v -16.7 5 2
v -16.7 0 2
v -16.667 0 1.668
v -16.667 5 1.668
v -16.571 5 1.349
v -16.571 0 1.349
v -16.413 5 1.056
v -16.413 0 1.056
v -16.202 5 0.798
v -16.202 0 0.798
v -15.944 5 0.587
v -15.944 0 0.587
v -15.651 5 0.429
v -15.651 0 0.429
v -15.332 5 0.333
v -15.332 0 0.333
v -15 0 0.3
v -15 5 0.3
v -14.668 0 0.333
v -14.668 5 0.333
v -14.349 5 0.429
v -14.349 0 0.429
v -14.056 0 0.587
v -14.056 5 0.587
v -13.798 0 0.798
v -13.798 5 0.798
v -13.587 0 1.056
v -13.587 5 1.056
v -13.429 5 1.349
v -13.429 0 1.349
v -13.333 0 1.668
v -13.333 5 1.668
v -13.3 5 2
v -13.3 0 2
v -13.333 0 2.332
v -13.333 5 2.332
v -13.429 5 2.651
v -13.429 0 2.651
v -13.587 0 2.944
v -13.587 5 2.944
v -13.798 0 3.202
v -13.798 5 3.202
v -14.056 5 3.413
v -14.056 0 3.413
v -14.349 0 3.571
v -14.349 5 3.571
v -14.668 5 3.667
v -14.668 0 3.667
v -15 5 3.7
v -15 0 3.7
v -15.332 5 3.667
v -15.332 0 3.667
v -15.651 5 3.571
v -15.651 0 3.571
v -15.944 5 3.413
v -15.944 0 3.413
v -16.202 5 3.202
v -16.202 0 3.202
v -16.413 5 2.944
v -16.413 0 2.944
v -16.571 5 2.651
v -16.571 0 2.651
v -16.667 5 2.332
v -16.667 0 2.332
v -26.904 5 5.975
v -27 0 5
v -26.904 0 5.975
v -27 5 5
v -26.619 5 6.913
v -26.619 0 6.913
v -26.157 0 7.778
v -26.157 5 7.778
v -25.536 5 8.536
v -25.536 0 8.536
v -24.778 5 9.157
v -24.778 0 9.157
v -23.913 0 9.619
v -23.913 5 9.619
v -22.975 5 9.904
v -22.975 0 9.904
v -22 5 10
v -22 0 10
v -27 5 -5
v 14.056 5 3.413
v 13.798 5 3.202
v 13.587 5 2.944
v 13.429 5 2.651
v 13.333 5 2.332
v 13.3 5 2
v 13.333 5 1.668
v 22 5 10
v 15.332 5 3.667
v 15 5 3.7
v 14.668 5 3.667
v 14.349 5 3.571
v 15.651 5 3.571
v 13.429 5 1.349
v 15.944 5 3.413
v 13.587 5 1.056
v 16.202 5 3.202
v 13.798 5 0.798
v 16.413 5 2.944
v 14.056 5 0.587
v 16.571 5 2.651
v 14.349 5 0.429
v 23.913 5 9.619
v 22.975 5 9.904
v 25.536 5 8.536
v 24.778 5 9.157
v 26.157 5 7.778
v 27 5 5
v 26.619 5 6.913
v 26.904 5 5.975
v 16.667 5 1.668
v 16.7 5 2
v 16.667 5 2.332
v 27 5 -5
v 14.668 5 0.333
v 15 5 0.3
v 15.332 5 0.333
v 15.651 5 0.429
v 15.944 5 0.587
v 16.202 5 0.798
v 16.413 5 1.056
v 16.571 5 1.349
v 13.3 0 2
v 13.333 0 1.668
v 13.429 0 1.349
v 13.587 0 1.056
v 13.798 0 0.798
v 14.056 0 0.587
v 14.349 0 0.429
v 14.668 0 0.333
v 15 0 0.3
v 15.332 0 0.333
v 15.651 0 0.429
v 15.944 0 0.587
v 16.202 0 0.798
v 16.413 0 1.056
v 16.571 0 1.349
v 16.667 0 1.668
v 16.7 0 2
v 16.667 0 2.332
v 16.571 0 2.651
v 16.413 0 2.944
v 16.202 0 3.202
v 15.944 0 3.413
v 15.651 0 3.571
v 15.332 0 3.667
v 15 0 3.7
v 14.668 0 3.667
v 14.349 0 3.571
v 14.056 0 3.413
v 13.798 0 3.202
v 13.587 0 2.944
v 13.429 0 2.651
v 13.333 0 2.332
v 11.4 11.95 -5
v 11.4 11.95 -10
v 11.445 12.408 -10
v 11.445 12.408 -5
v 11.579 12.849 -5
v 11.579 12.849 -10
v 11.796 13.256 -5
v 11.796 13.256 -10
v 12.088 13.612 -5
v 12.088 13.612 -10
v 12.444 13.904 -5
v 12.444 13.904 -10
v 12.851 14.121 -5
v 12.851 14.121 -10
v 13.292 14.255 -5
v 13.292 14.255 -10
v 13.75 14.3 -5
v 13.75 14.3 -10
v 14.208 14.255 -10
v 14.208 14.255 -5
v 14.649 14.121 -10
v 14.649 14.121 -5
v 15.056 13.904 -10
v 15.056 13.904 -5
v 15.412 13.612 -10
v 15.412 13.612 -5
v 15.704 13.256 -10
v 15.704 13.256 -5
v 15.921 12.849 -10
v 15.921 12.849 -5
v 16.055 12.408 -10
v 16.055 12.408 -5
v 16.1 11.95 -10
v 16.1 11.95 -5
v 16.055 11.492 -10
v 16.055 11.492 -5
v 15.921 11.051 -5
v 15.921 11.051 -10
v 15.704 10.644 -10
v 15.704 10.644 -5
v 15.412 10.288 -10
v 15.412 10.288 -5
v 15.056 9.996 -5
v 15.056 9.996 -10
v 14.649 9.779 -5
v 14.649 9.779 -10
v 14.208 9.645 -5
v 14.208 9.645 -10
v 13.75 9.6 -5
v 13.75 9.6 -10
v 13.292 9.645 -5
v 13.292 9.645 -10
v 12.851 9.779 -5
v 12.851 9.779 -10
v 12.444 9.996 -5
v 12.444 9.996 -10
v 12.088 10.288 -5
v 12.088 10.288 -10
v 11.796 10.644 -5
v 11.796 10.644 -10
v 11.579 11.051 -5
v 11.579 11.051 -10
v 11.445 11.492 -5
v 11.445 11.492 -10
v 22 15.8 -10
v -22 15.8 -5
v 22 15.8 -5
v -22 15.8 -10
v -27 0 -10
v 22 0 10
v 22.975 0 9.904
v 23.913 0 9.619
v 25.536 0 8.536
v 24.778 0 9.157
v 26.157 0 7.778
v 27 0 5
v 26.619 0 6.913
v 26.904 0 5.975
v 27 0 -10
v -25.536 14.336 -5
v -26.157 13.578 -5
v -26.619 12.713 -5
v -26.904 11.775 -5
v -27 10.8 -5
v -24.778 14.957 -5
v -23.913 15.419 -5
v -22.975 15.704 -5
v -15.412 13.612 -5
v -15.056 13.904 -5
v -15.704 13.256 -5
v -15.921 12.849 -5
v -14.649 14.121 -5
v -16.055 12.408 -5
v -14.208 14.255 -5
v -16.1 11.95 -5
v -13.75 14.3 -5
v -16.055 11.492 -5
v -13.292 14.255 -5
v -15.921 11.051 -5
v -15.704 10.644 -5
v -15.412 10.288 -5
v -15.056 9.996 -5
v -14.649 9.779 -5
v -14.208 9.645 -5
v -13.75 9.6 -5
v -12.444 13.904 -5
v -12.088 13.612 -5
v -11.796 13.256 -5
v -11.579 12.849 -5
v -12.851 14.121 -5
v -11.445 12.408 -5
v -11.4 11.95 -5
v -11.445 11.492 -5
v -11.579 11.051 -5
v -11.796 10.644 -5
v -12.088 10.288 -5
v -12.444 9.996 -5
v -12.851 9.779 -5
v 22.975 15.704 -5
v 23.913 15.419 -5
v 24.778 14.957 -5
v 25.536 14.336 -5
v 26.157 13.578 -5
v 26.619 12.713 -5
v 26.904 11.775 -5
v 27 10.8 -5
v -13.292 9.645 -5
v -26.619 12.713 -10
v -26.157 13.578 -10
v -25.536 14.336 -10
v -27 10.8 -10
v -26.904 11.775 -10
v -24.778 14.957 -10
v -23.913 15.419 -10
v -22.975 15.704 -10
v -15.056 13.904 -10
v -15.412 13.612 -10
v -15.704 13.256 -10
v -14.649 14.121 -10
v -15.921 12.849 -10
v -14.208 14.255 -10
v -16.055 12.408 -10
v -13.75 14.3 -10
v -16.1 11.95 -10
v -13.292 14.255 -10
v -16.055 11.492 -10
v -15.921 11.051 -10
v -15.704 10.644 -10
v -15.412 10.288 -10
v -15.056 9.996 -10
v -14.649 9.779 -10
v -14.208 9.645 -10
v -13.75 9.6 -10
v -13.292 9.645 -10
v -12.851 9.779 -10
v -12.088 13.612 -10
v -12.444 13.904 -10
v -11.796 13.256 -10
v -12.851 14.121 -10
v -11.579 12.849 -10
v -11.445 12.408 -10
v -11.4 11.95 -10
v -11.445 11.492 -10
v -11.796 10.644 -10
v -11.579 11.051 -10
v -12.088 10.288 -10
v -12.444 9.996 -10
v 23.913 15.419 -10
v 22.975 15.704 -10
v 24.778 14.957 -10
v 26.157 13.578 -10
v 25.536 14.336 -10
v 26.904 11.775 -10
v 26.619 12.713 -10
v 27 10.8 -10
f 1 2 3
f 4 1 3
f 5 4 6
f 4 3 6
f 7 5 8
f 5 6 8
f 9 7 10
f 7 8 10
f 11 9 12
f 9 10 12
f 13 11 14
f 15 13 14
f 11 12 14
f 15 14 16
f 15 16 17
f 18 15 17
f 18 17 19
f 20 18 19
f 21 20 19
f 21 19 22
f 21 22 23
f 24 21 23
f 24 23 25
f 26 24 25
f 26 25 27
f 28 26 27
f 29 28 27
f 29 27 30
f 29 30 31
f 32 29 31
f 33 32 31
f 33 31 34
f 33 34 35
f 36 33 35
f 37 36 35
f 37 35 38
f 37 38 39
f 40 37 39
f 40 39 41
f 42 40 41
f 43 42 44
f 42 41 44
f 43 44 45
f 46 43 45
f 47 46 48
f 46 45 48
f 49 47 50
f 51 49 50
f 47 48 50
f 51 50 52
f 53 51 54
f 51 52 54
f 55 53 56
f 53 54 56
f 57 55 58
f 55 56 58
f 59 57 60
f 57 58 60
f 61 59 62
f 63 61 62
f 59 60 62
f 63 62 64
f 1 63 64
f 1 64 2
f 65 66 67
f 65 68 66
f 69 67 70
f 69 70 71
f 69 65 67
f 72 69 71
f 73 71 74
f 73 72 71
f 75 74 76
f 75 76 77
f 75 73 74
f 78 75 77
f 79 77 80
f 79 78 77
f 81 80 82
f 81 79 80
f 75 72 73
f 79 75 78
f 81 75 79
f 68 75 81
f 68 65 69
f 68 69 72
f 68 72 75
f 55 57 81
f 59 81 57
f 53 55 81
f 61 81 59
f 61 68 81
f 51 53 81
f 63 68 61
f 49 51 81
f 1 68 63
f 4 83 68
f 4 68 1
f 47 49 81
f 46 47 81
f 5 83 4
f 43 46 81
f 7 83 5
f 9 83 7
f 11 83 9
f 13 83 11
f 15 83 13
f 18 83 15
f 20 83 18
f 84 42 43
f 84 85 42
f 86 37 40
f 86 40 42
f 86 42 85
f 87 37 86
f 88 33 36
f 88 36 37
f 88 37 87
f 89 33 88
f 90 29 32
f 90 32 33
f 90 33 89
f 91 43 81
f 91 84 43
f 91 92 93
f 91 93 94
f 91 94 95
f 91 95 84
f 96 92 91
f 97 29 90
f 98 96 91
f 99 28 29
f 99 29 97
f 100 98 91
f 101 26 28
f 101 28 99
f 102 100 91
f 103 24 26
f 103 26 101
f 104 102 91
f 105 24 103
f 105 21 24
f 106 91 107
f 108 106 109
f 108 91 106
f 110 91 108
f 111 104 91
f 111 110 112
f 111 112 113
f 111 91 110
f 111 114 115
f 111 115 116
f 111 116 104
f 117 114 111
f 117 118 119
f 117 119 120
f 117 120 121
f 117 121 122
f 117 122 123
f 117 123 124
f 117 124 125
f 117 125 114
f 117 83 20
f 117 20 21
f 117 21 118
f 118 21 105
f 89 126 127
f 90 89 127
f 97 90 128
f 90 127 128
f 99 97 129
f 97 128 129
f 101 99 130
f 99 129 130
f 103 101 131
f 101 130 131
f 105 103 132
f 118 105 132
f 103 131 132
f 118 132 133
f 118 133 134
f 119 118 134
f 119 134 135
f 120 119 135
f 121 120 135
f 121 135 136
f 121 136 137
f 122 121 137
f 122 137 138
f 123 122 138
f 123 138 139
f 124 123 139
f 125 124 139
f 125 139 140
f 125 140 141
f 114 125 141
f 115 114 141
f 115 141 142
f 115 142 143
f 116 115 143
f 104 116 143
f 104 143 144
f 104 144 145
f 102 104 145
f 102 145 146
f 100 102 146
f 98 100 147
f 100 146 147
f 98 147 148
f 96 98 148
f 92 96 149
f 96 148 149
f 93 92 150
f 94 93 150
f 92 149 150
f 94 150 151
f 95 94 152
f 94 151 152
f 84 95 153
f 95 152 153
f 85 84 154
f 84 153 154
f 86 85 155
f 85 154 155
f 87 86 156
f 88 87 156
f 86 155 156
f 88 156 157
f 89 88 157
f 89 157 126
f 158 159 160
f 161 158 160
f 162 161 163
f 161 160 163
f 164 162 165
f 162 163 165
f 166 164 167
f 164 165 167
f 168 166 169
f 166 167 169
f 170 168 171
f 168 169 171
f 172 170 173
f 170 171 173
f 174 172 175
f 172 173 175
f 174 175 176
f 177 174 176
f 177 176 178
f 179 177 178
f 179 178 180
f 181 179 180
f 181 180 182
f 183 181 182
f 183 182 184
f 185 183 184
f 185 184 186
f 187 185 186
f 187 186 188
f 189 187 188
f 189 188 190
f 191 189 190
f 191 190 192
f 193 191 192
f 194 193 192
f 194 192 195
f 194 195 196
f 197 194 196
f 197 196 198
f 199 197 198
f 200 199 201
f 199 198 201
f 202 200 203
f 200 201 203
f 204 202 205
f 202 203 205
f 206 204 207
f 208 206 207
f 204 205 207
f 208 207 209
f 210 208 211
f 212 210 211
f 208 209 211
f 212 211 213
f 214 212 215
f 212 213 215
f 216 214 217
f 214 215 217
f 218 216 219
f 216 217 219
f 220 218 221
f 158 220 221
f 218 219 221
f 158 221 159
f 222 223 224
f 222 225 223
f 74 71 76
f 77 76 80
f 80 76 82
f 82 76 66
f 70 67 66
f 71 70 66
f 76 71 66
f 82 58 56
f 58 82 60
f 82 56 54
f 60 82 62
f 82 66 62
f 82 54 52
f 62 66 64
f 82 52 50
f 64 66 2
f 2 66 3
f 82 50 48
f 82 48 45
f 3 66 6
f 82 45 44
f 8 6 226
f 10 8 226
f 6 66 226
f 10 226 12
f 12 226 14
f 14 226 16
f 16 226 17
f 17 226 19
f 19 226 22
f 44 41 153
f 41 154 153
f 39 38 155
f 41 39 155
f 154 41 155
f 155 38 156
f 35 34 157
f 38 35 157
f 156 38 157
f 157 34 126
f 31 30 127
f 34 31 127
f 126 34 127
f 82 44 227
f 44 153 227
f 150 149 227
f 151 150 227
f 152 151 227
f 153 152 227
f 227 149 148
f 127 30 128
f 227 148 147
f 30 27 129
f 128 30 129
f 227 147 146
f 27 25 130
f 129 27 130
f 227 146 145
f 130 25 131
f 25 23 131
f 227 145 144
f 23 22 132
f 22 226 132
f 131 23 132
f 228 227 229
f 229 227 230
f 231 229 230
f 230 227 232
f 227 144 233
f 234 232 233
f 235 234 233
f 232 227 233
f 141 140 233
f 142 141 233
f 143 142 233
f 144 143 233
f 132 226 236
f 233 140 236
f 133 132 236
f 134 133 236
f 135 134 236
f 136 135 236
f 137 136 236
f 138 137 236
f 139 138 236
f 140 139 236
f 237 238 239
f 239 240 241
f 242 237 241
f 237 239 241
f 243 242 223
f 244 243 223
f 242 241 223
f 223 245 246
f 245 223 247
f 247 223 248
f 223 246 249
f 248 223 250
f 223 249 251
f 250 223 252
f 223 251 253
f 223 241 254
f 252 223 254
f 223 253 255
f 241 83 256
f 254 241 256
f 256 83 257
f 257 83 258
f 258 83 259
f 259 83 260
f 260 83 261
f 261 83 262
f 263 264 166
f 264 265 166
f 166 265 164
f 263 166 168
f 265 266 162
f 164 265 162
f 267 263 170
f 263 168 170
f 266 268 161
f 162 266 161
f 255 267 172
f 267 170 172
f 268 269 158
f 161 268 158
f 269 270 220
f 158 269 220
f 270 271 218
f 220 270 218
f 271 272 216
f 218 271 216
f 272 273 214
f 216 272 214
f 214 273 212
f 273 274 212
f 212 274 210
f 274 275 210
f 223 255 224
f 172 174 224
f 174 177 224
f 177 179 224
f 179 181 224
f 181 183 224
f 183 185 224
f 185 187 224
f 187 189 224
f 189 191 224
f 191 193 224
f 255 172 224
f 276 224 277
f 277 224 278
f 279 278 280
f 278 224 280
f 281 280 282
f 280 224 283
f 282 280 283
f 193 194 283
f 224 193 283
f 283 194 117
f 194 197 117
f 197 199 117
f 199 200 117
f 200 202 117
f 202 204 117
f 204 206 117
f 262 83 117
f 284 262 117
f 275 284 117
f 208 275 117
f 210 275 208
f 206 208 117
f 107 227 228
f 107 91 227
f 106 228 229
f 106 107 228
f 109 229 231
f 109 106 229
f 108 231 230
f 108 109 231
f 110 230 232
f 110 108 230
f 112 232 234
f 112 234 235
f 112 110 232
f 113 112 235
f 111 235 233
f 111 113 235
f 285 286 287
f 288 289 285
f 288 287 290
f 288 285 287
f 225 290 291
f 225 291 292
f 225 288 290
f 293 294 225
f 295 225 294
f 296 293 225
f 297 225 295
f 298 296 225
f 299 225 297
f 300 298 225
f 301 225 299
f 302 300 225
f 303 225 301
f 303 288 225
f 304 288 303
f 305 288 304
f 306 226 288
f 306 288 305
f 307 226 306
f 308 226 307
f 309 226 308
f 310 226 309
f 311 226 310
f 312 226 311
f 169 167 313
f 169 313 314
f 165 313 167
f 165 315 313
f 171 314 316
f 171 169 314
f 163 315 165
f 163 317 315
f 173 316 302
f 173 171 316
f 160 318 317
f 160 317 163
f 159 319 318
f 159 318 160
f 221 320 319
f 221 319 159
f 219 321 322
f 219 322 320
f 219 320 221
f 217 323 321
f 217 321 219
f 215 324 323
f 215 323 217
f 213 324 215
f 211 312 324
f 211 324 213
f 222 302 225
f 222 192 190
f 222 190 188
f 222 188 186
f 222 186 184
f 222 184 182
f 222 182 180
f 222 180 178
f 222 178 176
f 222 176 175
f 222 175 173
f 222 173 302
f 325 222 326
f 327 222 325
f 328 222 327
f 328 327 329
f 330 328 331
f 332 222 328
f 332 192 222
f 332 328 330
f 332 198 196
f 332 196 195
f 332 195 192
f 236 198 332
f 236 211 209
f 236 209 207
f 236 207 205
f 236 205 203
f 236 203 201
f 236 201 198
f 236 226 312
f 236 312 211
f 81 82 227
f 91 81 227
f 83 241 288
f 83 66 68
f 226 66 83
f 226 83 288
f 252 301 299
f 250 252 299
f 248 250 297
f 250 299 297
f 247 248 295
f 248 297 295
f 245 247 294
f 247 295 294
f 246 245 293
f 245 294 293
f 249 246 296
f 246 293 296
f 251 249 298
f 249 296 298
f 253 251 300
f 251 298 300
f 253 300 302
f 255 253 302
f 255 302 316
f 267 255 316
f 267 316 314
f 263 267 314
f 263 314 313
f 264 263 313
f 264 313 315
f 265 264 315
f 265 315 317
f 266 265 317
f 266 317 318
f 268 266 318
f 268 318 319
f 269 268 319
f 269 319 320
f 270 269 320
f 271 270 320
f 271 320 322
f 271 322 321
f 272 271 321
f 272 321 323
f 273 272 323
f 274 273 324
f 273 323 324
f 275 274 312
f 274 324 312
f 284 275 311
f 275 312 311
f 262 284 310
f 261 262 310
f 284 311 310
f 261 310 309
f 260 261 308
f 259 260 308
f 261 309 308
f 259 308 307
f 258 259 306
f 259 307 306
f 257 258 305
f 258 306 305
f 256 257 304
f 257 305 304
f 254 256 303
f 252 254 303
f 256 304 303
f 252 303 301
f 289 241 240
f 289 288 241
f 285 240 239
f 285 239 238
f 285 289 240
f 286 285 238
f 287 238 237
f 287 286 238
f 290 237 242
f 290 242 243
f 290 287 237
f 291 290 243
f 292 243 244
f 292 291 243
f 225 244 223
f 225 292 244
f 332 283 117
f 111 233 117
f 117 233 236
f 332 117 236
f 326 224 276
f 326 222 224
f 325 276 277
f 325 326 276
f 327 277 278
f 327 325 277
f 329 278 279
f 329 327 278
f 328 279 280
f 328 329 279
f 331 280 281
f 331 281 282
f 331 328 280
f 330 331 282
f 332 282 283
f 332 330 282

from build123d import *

# Parameters (mm, degrees)
SKETCH1_W                = 54
SKETCH1_H                = 20
BOSS_EXTRUDE1_DEPTH      = 5
SKETCH2_W                = 54
SKETCH2_H                = 5
BOSS_EXTRUDE2_DEPTH      = 10.8
M3_CLEARANCE_HOLE1_D     = 3.4
M3_CLEARANCE_HOLE1_DEPTH = 28.71
M3_CLEARANCE_HOLE1_TIP   = 1.021463052
M3_CLEARANCE_HOLE2_D     = 3.4
FILLET1_R                = 5
SKETCH11_R               = 2.35
CUT_EXTRUDE4_DEPTH       = 7.8
SKETCH9_R                = 2.35
CUT_EXTRUDE5_DEPTH       = 7.8


with BuildPart() as part:
    # Sketch1 → Boss-Extrude1 (new body)
    with BuildSketch(Plane(origin=(0, 0, 0), x_dir=(1, 0, 0), z_dir=(0, 1, 0))):
        Rectangle(SKETCH1_W, SKETCH1_H)
    extrude(amount=BOSS_EXTRUDE1_DEPTH)

    # Sketch2 → Boss-Extrude2 (add)
    with BuildSketch(Plane(origin=(0, 5, 0), x_dir=(1, 0, 0), z_dir=(0, 1, 0))):
        with Locations((0, 7.5)):
            Rectangle(SKETCH2_W, SKETCH2_H)
    extrude(amount=BOSS_EXTRUDE2_DEPTH)

    # M3 Clearance Hole1
    with Locations(Plane.XY.offset(-5)):
        with Locations((-13.75, 12.6), (13.75, 12.6)):
            Hole(M3_CLEARANCE_HOLE1_D / 2, depth=M3_CLEARANCE_HOLE1_DEPTH)
            with Locations((0, 0, -(M3_CLEARANCE_HOLE1_DEPTH + M3_CLEARANCE_HOLE1_TIP / 2))):  # 118° drill point
                Cone(0, M3_CLEARANCE_HOLE1_D / 2, M3_CLEARANCE_HOLE1_TIP, mode=Mode.SUBTRACT)

    # M3 Clearance Hole2 (through all)
    with Locations(Plane(origin=(0, 5, 0), x_dir=(1, 0, 0), z_dir=(0, 1, 0))):
        with Locations((15, -2), (-15, -2)):
            Hole(M3_CLEARANCE_HOLE2_D / 2)

    # Fillet1
    fillet1_edges = [part.edges().sort_by_distance(p)[0] for p in [
        (27, 2.5, 10),
        (-27, 2.5, 10),
        (27, 15.8, -7.5),
        (-27, 15.8, -7.5),
    ]]
    fillet(fillet1_edges, radius=FILLET1_R)

    # Sketch11 → Cut-Extrude4 (cut)
    with BuildSketch(Plane(origin=(0, 0, -10), x_dir=(-1, 0, 0), z_dir=(0, 0, -1))):
        with Locations((-13.75, 11.95)):
            Circle(SKETCH11_R)
    extrude(amount=-CUT_EXTRUDE4_DEPTH, mode=Mode.SUBTRACT)

    # Sketch9 → Cut-Extrude5 (cut)
    with BuildSketch(Plane(origin=(0, 0, -10), x_dir=(-1, 0, 0), z_dir=(0, 0, -1))):
        with Locations((13.75, 11.95)):
            Circle(SKETCH9_R)
    extrude(amount=-CUT_EXTRUDE5_DEPTH, mode=Mode.SUBTRACT)


solid = part.part
